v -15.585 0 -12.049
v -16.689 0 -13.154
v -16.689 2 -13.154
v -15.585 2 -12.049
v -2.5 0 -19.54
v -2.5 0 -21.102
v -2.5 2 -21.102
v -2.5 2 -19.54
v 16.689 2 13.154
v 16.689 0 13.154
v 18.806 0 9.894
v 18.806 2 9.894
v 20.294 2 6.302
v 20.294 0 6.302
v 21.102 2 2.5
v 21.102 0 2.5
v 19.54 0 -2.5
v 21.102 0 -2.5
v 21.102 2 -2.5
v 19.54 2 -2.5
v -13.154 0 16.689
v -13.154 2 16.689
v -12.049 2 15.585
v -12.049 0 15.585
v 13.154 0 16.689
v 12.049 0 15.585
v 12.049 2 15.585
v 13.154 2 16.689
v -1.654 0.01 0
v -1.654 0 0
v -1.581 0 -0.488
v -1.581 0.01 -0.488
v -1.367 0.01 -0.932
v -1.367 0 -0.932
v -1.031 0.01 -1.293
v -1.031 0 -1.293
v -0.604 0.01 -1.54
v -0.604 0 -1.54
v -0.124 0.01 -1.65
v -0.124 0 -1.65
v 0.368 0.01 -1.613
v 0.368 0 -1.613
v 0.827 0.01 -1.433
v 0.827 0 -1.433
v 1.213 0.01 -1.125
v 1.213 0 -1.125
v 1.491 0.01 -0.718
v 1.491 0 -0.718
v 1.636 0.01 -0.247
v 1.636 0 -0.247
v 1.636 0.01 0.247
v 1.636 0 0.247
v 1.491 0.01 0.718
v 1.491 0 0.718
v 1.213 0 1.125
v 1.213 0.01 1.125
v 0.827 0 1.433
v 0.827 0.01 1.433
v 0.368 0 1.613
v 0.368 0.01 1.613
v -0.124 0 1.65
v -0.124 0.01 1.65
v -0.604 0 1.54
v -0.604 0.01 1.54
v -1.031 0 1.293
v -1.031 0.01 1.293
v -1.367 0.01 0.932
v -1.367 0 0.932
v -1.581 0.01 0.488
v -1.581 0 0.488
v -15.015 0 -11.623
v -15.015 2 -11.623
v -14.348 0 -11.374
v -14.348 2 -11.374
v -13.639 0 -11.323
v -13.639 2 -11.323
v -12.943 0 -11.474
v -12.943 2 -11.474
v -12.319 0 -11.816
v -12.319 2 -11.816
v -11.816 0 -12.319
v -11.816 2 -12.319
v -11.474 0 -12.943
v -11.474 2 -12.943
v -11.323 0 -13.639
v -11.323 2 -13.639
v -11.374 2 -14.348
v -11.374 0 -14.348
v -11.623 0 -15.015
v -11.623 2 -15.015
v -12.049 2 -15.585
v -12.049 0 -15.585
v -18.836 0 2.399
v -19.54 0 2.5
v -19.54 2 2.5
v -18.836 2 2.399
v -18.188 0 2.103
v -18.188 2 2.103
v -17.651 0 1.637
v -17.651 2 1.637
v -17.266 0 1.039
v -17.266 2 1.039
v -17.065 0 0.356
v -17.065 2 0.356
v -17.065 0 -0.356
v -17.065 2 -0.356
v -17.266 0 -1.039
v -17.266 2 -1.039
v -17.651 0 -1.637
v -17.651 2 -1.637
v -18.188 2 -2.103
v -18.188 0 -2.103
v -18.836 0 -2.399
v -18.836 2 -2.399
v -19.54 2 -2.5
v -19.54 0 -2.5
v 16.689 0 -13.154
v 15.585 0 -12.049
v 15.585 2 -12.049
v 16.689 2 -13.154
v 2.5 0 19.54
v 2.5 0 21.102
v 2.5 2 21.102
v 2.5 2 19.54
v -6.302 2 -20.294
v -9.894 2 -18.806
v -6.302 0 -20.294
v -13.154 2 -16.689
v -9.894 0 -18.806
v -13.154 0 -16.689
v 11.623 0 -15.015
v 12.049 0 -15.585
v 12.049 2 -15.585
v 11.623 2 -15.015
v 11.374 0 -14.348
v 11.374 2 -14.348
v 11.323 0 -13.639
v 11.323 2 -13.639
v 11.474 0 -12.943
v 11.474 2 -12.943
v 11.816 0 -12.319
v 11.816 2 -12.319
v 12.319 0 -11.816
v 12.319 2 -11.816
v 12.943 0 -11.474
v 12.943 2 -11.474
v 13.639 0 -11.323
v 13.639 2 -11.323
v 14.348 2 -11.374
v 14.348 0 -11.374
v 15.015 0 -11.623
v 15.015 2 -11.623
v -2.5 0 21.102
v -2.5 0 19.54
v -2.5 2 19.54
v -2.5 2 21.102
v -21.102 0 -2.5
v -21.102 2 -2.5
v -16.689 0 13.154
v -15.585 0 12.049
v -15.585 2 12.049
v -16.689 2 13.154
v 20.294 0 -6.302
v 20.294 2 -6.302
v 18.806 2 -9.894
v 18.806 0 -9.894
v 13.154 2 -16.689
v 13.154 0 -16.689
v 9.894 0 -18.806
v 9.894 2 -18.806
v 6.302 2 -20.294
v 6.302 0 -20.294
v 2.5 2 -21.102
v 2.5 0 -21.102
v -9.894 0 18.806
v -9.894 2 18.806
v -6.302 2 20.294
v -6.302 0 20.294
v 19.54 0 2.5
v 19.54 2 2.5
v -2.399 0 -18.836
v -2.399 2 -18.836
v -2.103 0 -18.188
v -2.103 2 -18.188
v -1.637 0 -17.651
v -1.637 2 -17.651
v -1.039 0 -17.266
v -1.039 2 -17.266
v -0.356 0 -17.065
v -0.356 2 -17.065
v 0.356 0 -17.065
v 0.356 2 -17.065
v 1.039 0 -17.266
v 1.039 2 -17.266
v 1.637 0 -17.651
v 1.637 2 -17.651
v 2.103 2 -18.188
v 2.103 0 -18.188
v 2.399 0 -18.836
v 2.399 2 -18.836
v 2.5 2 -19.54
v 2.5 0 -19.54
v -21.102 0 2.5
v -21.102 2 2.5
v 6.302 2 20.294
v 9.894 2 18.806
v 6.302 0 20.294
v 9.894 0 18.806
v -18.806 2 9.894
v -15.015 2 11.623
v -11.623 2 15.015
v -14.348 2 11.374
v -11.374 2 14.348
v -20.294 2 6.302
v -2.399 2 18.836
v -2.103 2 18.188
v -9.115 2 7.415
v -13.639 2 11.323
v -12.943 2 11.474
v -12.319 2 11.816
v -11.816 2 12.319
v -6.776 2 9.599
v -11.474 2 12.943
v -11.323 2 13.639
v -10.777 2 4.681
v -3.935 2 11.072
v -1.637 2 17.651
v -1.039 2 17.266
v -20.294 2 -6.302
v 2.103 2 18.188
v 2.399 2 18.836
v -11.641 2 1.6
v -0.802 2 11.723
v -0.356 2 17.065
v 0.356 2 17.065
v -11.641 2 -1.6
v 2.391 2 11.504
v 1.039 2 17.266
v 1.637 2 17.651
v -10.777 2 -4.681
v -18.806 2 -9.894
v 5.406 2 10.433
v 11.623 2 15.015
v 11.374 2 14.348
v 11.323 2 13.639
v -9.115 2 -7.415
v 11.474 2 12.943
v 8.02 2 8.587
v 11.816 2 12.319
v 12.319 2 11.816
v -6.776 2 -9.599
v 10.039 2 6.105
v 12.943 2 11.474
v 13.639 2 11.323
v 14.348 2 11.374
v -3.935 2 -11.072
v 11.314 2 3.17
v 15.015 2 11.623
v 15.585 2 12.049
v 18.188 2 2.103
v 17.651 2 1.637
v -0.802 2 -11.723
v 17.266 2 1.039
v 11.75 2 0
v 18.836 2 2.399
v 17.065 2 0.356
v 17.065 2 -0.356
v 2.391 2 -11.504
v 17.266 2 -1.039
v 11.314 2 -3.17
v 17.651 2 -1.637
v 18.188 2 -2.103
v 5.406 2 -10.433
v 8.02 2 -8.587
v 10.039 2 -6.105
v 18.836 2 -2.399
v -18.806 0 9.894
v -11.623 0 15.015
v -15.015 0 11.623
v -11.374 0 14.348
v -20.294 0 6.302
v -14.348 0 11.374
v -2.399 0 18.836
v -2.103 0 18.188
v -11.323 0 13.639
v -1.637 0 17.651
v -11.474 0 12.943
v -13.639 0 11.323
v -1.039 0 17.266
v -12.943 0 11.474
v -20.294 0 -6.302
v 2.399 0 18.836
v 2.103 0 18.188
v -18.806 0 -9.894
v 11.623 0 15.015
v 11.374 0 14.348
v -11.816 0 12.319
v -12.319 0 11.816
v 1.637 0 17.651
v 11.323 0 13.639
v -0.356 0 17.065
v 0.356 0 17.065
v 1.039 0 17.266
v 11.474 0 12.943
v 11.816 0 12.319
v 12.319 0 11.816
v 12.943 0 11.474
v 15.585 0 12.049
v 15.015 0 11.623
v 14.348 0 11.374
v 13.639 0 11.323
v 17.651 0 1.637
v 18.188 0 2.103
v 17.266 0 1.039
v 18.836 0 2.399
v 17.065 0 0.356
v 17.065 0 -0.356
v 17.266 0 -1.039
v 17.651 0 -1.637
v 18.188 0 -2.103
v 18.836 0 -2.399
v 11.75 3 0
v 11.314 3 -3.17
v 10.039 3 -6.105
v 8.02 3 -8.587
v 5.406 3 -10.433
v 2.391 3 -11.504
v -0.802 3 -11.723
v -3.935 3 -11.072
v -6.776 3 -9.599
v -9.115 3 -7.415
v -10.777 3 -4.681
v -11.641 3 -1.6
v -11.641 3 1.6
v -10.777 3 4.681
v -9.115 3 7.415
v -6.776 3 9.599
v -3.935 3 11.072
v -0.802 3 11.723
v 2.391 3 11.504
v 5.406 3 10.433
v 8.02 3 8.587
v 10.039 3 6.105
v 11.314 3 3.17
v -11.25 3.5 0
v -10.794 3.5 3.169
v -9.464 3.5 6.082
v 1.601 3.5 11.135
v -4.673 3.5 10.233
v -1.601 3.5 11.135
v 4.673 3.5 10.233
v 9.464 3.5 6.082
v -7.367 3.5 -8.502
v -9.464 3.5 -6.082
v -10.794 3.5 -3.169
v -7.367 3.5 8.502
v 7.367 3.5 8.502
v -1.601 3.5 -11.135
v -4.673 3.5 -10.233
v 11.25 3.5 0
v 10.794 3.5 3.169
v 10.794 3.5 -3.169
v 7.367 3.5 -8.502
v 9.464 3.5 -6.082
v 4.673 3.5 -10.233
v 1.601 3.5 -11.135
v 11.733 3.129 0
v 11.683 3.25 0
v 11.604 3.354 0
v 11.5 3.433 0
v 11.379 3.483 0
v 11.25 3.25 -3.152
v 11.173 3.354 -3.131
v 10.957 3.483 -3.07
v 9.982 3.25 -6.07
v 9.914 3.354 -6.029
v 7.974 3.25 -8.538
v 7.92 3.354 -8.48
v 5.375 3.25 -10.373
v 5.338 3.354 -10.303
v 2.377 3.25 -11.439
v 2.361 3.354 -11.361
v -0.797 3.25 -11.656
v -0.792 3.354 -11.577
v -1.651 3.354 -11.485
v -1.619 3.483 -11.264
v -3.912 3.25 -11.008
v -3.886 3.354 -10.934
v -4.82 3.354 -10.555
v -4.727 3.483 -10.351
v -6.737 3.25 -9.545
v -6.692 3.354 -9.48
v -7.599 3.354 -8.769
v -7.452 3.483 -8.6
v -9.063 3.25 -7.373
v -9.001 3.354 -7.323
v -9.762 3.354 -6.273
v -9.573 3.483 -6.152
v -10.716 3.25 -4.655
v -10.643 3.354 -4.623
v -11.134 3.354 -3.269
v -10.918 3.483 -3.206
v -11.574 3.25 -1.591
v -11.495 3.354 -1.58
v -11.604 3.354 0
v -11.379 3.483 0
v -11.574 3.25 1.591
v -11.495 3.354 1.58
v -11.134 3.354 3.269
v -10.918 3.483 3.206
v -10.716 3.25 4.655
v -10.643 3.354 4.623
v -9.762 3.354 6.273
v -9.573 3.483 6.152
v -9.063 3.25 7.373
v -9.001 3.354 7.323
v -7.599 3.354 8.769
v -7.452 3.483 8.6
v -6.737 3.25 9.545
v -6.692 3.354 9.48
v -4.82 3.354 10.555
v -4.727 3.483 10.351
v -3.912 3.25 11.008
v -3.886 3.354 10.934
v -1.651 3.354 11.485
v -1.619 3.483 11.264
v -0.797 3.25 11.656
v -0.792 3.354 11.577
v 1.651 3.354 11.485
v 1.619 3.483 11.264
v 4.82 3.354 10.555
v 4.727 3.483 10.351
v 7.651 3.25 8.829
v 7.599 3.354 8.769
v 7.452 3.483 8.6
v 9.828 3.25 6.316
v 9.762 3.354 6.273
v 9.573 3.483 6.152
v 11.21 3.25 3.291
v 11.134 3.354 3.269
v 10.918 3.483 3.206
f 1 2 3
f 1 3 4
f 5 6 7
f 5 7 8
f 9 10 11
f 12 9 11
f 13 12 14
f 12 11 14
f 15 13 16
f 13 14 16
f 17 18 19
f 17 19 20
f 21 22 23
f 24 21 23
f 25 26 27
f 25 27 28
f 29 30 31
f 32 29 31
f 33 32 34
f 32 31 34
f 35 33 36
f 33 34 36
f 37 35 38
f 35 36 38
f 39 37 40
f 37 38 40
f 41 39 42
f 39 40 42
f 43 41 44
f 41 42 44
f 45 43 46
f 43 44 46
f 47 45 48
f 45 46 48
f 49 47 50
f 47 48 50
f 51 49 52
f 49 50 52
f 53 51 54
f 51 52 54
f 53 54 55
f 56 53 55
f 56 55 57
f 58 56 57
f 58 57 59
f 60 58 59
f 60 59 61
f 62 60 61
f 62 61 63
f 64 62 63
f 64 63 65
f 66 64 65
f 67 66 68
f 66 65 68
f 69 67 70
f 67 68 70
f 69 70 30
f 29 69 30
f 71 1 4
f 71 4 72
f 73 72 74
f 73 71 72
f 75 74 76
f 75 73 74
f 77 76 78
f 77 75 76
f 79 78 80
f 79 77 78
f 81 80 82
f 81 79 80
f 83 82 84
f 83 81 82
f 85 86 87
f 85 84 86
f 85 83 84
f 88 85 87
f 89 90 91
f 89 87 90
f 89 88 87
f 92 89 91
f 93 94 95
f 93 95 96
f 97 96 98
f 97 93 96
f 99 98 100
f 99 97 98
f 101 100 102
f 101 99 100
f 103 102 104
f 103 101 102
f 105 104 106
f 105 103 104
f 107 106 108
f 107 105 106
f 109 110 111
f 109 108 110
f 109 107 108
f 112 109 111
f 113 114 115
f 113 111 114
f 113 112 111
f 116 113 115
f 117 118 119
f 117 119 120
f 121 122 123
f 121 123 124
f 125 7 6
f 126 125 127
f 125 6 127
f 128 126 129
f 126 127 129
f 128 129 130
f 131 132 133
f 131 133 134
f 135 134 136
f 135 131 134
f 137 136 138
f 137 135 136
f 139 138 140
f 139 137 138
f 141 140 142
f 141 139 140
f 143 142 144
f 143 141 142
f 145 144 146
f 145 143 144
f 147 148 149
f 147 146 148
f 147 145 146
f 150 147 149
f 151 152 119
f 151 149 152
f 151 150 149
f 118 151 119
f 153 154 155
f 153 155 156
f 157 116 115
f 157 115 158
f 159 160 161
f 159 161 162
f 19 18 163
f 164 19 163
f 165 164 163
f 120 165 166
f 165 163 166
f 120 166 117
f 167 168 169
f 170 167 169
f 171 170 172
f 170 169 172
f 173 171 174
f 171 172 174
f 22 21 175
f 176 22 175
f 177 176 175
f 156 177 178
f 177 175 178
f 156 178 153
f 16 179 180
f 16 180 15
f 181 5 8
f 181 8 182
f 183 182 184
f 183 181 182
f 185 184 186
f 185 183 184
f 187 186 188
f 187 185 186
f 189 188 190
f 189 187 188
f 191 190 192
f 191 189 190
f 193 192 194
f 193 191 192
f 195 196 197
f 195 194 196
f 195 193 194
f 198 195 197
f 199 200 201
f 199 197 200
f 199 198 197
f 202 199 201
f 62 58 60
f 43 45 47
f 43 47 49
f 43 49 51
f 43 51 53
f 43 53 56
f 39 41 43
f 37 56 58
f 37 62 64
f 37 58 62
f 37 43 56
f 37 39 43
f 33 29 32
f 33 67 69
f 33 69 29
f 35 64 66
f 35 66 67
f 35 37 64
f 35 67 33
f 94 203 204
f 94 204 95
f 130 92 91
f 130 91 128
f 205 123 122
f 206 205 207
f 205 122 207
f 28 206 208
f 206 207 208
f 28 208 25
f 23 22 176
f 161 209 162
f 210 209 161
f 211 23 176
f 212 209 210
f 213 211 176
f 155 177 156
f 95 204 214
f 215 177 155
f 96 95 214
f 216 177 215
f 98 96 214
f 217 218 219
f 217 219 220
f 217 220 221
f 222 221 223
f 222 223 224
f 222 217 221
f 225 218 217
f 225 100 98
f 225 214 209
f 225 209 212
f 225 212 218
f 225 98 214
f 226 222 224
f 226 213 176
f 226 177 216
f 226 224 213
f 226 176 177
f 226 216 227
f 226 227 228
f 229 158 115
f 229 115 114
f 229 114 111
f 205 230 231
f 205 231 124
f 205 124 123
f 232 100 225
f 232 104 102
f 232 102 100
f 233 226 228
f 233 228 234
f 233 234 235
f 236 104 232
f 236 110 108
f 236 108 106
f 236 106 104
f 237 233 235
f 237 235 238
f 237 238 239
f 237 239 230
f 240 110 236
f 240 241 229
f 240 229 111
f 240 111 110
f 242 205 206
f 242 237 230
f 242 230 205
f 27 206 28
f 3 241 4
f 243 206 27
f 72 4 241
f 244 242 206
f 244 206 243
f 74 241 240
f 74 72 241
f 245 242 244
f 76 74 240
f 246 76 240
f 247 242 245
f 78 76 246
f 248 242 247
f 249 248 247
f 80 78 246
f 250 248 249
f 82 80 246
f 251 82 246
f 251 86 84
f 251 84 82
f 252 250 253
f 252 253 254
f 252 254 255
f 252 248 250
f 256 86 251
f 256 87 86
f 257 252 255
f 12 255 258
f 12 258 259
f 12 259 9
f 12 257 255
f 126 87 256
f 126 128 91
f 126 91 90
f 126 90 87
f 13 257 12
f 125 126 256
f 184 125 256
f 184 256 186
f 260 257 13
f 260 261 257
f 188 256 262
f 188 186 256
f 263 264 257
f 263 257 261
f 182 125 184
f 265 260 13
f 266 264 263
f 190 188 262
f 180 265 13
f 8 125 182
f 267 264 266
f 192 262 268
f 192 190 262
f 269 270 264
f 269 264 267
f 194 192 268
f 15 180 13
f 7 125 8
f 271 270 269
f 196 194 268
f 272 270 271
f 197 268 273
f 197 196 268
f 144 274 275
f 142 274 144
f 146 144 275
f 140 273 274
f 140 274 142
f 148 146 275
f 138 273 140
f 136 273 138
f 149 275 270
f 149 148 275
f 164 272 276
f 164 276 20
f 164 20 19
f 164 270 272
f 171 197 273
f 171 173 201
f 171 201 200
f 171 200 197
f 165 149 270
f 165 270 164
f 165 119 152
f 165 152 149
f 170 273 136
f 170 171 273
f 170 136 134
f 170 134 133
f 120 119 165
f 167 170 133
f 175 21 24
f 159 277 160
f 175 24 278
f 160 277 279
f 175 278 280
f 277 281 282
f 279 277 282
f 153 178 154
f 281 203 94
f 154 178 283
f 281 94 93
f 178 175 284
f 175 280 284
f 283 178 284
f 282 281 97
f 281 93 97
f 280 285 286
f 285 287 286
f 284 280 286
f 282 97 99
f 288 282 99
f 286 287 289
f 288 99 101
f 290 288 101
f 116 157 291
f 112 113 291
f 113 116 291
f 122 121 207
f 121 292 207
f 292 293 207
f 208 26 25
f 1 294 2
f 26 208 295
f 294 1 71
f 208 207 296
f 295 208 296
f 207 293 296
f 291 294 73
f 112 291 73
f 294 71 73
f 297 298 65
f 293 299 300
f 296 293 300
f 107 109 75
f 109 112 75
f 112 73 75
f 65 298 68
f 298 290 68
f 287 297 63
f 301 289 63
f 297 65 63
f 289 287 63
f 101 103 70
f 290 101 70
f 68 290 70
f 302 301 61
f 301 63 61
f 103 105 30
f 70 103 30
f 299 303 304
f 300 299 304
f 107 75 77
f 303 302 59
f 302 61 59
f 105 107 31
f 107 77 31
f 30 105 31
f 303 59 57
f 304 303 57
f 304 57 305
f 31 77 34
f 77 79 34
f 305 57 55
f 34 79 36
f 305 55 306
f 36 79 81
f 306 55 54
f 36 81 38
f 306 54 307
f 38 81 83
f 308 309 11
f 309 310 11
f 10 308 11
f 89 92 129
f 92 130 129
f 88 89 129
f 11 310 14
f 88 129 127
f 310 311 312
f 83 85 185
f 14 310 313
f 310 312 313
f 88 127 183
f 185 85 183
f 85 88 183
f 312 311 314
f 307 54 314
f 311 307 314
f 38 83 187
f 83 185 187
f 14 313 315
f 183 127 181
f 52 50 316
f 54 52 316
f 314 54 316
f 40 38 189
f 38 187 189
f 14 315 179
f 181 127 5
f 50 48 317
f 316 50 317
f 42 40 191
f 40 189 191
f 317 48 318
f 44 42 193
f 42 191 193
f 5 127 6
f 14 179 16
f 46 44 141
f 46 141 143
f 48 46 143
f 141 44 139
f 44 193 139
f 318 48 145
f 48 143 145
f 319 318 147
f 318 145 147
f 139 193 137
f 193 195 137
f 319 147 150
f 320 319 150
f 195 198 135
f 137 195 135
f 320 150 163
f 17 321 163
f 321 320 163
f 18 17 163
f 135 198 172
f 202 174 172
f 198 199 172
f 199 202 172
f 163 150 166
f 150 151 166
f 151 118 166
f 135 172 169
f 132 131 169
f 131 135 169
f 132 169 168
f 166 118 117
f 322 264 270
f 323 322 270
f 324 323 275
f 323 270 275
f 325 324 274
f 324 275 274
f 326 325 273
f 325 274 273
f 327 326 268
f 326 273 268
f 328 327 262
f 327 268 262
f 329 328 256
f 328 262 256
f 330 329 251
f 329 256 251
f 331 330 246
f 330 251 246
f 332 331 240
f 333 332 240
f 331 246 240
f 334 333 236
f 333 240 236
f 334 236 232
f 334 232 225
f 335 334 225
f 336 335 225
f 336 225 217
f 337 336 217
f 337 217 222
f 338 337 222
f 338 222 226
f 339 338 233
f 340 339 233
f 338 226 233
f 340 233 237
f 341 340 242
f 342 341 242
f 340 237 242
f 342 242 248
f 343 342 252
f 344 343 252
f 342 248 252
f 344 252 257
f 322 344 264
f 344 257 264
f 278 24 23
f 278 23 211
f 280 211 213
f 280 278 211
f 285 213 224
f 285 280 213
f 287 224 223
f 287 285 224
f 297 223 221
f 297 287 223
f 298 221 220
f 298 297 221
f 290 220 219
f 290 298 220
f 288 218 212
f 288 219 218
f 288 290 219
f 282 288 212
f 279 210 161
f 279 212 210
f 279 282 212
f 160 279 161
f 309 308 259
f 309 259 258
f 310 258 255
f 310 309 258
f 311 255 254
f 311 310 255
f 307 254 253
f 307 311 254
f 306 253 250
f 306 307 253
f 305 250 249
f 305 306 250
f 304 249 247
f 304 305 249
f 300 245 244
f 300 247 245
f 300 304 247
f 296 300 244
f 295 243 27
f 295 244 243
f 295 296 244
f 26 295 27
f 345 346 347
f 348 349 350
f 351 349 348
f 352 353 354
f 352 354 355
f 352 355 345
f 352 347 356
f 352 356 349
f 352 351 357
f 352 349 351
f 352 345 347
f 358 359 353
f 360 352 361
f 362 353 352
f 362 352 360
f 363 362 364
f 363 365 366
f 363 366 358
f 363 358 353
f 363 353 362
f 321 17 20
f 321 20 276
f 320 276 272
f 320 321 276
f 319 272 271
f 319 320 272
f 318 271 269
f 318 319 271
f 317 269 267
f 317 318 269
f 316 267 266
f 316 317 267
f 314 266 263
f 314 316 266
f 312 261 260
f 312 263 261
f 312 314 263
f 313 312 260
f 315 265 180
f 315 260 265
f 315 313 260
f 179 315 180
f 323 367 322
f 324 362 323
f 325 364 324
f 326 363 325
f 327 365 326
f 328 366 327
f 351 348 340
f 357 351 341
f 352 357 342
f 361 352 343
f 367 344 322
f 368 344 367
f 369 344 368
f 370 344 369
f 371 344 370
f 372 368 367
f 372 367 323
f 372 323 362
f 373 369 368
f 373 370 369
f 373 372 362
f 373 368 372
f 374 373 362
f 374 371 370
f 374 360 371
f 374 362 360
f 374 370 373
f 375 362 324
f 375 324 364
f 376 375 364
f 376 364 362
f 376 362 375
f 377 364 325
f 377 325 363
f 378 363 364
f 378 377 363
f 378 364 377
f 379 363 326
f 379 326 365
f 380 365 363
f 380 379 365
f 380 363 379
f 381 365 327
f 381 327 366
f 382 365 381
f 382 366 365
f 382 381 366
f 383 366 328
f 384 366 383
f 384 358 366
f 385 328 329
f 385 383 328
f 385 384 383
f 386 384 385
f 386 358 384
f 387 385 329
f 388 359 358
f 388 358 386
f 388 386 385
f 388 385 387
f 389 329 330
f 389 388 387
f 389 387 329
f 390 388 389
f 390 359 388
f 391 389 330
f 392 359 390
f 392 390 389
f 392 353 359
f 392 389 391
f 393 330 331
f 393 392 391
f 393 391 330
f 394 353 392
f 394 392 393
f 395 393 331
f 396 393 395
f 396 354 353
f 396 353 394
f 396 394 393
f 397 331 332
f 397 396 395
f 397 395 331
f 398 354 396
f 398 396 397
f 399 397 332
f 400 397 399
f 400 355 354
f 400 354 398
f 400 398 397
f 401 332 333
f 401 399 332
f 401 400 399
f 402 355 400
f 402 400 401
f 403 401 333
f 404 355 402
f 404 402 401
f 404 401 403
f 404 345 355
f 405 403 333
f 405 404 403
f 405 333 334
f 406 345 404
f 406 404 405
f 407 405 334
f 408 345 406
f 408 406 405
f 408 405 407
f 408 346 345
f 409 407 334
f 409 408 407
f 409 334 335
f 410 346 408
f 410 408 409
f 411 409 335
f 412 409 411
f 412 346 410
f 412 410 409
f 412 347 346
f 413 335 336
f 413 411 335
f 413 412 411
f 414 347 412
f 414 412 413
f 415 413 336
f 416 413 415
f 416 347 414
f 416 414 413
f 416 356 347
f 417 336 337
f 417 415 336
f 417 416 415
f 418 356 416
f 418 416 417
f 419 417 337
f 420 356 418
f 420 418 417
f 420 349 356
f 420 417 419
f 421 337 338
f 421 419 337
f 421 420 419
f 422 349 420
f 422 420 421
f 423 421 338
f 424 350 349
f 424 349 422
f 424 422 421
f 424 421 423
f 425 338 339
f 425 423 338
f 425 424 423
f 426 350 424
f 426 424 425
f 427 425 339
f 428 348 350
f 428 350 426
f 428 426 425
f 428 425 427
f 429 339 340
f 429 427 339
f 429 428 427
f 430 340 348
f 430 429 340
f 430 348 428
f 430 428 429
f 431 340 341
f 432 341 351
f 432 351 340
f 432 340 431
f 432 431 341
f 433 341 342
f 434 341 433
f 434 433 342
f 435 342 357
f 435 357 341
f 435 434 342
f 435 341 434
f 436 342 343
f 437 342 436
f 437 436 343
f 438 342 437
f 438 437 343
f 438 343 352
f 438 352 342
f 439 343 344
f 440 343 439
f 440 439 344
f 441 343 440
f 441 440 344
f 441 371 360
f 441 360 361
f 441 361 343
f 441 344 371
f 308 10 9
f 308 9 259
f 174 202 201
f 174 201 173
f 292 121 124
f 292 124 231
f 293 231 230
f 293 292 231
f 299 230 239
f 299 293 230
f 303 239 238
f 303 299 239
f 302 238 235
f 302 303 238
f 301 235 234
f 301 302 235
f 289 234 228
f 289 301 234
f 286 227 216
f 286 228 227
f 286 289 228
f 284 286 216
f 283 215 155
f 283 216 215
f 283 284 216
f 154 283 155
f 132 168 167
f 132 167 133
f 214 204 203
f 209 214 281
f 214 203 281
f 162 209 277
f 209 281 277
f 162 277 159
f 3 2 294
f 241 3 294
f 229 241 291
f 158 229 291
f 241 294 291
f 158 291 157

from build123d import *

# Parameters (mm, degrees)
SKETCH1_R           = 21.25
BOSS_EXTRUDE1_DEPTH = 2
SKETCH2_R           = 11.75
BOSS_EXTRUDE2_DEPTH = 1.5
FILLET1_R           = 0.5
CUT_EXTRUDE2_DEPTH  = 4.5
SKETCH5_R           = 1.654382936
CUT_EXTRUDE3_DEPTH  = 0.01
CIRPATTERN1_COUNT   = 8


with BuildPart() as part:
    # Sketch1 → Boss-Extrude1 (new body)
    with BuildSketch(Plane(origin=(0, 0, 0), x_dir=(1, 0, 0), z_dir=(0, 1, 0))):
        Circle(SKETCH1_R)
    extrude(amount=BOSS_EXTRUDE1_DEPTH)

    # Sketch2 → Boss-Extrude2 (add)
    with BuildSketch(Plane(origin=(0, 2, 0), x_dir=(1, 0, 0), z_dir=(0, 1, 0))):
        Circle(SKETCH2_R)
    extrude(amount=BOSS_EXTRUDE2_DEPTH)

    # Fillet1
    fillet1_edges = [part.edges().sort_by_distance(p)[0] for p in [
        (-11.75, 3.5, 0),
    ]]
    fillet(fillet1_edges, radius=FILLET1_R)

    # Sketch4 → Cut-Extrude2 (cut, through all)
    with BuildSketch(Plane.XZ):
        with BuildLine():
            Line((-2.5, 19.54), (-2.5, 23.75))
            Line((-2.5, 23.75), (2.5, 23.75))
            Line((2.5, 23.75), (2.5, 19.54))
            ThreePointArc((2.5, 19.54), (0, 17.04), (-2.5, 19.54))
        make_face()
    cut_extrude2 = extrude(amount=-CUT_EXTRUDE2_DEPTH, mode=Mode.SUBTRACT)

    # Sketch5 → Cut-Extrude3 (cut)
    with BuildSketch(Plane(origin=(0, 0, 0), x_dir=(-1, 0, 0), z_dir=(0, -1, 0))):
        Circle(SKETCH5_R)
    extrude(amount=-CUT_EXTRUDE3_DEPTH, mode=Mode.SUBTRACT)

    # CirPattern1: Cut-Extrude2 ×8 about axis
    cirpattern1_axis = Axis((0, 0, 0), (0, 1, 0))
    for i in range(1, CIRPATTERN1_COUNT):
        add(cut_extrude2.rotate(cirpattern1_axis, i * 360 / CIRPATTERN1_COUNT), mode=Mode.SUBTRACT)


solid = part.part
